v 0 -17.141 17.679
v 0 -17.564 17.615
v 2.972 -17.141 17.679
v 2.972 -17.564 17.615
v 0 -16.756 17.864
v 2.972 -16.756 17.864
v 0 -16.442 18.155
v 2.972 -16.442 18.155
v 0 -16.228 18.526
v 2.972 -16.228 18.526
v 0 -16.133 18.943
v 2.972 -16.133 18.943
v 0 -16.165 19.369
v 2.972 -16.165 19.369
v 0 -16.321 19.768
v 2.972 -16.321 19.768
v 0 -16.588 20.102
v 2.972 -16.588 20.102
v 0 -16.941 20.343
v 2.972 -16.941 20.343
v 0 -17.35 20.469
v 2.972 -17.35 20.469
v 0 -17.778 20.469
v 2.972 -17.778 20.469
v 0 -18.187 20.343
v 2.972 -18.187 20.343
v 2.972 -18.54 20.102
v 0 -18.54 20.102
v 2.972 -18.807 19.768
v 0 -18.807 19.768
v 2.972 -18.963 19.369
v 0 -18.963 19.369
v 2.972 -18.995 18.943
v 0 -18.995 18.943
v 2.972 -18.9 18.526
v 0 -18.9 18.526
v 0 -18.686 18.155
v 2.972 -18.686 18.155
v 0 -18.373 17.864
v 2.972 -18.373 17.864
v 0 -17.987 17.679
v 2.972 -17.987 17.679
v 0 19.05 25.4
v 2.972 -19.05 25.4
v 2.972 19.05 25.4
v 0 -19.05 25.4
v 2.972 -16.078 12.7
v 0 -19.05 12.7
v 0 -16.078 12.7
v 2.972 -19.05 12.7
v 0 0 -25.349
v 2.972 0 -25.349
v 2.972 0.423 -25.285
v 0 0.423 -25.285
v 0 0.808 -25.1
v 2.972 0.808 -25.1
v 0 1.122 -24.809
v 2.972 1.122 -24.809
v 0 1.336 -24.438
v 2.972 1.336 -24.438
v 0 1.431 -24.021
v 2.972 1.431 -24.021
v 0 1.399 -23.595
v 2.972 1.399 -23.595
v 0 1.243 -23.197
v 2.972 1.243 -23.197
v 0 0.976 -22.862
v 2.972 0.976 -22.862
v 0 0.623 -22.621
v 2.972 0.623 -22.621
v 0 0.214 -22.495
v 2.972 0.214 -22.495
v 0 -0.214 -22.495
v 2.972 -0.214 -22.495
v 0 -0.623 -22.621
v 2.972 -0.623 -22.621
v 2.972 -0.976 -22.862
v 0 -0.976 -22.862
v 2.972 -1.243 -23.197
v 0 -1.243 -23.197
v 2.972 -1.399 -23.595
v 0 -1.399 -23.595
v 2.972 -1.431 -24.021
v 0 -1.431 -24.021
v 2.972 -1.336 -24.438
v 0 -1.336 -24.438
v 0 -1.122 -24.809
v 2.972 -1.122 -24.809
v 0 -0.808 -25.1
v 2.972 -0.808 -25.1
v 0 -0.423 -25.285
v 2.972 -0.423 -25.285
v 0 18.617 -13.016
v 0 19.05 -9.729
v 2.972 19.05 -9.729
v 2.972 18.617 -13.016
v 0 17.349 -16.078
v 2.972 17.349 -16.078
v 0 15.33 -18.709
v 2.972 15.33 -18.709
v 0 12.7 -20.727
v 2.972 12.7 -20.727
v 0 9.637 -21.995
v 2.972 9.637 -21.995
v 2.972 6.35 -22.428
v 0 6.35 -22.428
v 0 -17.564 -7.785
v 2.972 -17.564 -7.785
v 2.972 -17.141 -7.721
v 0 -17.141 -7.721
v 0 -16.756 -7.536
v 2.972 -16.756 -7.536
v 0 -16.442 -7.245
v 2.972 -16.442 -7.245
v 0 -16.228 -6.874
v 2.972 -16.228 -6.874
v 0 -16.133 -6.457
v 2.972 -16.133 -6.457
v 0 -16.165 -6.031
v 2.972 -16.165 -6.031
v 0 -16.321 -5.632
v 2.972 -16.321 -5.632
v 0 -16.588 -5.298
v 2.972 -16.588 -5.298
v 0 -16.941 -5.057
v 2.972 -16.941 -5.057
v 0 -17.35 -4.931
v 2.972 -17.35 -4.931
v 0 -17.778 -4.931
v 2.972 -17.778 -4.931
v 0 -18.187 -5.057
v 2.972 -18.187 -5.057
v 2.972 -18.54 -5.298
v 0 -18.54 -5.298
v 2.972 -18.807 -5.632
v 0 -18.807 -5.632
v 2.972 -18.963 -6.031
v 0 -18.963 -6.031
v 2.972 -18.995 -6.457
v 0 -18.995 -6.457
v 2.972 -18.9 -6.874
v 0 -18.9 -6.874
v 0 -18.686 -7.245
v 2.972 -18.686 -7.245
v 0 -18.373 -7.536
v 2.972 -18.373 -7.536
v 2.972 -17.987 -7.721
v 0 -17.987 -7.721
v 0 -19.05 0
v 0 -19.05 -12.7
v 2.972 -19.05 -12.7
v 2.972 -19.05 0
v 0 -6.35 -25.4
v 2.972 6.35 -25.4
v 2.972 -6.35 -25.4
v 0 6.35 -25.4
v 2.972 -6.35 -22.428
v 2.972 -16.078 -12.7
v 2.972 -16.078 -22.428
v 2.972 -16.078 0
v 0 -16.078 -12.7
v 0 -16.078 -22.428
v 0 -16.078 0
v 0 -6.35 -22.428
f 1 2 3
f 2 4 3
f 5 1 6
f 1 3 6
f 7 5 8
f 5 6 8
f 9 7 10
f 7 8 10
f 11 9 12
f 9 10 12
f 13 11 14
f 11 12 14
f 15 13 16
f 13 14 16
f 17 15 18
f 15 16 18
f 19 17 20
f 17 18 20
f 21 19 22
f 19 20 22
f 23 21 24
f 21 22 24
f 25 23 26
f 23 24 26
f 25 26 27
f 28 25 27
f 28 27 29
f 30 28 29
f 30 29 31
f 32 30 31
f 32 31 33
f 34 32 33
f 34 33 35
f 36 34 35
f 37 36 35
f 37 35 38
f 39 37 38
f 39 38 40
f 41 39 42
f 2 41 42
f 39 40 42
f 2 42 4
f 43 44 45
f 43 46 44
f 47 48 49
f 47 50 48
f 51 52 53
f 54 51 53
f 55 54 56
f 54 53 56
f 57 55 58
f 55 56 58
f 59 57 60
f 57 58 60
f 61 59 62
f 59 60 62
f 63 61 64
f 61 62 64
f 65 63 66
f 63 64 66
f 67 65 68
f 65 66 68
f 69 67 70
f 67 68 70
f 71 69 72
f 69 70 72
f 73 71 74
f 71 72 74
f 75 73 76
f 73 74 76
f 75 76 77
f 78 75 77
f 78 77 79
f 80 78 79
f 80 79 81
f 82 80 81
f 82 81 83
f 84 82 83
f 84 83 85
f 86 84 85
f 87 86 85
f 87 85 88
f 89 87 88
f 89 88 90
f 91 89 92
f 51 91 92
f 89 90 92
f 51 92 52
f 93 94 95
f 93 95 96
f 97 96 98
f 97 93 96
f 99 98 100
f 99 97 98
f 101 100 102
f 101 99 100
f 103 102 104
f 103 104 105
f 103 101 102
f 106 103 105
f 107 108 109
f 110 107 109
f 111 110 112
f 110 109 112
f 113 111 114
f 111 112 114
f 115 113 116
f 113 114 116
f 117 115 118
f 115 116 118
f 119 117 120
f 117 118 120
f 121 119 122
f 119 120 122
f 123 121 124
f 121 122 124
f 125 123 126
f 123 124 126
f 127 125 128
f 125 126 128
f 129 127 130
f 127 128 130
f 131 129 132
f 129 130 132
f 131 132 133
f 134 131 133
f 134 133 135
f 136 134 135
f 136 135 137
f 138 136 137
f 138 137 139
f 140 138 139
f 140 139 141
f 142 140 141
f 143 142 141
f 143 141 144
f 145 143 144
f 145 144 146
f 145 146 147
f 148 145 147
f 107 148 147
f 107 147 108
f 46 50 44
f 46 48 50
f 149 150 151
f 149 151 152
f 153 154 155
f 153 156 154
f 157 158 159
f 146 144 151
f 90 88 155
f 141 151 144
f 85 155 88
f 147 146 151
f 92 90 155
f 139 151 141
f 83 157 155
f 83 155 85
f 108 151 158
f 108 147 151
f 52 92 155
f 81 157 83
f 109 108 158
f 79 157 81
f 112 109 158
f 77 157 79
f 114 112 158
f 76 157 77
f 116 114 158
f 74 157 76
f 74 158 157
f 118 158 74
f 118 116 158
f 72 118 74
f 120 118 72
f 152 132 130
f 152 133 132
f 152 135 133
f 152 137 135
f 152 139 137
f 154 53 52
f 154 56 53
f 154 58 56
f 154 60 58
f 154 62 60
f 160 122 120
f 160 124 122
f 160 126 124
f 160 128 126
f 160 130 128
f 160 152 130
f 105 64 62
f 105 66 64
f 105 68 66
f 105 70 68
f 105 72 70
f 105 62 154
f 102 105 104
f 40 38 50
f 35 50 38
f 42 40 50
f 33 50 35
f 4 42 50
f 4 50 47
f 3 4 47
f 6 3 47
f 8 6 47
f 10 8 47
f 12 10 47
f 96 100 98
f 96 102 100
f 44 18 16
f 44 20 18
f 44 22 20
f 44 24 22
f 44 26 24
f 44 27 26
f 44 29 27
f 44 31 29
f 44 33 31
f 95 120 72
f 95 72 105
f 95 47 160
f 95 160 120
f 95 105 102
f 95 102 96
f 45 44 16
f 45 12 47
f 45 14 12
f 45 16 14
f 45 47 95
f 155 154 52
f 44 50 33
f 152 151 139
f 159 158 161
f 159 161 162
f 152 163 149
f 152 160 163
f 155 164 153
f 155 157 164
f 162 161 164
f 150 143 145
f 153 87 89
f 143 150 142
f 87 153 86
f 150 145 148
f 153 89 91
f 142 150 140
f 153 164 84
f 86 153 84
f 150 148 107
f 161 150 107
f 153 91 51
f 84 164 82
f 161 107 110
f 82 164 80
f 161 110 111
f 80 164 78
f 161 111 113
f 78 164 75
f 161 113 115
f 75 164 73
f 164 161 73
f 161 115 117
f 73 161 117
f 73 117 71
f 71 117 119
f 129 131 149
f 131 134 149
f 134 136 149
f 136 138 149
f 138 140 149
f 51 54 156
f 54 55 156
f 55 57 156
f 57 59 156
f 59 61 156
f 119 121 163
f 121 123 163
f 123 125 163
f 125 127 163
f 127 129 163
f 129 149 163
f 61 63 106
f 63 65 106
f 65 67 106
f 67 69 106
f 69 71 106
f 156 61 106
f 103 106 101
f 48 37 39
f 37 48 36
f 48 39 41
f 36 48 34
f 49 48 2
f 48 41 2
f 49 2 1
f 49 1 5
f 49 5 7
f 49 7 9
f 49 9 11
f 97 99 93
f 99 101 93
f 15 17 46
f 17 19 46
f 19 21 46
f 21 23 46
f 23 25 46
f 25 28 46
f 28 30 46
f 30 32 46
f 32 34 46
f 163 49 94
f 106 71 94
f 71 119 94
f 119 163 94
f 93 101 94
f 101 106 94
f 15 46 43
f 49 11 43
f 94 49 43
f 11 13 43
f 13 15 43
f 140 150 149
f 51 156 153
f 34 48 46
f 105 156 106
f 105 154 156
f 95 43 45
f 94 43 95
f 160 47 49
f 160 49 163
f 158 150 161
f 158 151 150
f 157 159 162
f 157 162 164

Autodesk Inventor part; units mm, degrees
ref_plane "YZ Plane" through (0, 0, 0) normal (1, 0, 0) x (0, 1, 0)
ref_plane "XZ Plane" through (0, 0, 0) normal (0, 1, 0) x (-1, 0, 0)
ref_plane "XY Plane" through (0, 0, 0) normal (0, 0, 1) x (1, 0, 0)
sketch "Sketch1" plane through (0, 0, 0) normal (1, 0, 0) x (0, 1, 0)
  line L0 (-19.05, 25.4) -> (19.05, 25.4)
  line L1 (19.05, 25.4) -> (19.05, -25.4)
  line L2 (19.05, -25.4) -> (-19.05, -25.4)
  line L3 (-19.05, -25.4) -> (-19.05, 25.4)
  line L4 (-19.05, 25.4) -> (19.05, -25.4) construction
  line L5 (19.05, 25.4) -> (-19.05, -25.4) construction
  point P0 (0, 0)
  dimension "d0" = 38.1
  dimension "d1" = 50.8
extrude "Extrusion1" add sketch "Sketch1" along normal blind 2.9718
sketch "Sketch2" plane through (2.9718, 0, 0) normal (1, 0, 0) x (0, 0, -1)
  line L0 (-25.4, -19.05) -> (25.4, -19.05) projected
  line L1 (25.4, -19.05) -> (12.7, -19.05)
  line L2 (12.7, -19.05) -> (12.7, -16.0782)
  line L3 (12.7, -16.0782) -> (25.4, -16.0782)
  line L4 (25.4, -16.0782) -> (25.4, -19.05)
  line L5 (0, -19.05) -> (-12.7, -19.05)
  line L6 (-12.7, -19.05) -> (-12.7, -16.0782)
  line L7 (-12.7, -16.0782) -> (0, -16.0782)
  line L8 (0, -16.0782) -> (0, -19.05)
  point P0 (0, 0)
  dimension "d4" = 12.7
  dimension "d5" = 2.9718
  dimension "d6" = 12.7
extrude "Extrusion2" cut sketch "Sketch2" against normal blind 2.9718
sketch "Sketch3" plane through (2.9718, 0, 0) normal (1, 0, 0) x (0, 0, -1)
  line L0 (25.4, -19.05) -> (22.4282, -19.05)
  line L1 (22.4282, -19.05) -> (22.4282, -6.35)
  line L2 (22.4282, -6.35) -> (25.4, -6.35)
  line L3 (25.4, -6.35) -> (25.4, -19.05)
  line L4 (0, -19.05) -> (12.7, -19.05) projected
  line L5 (25.4, -16.0782) -> (25.4, 19.05) projected
  line L6 (25.4, 6.35) -> (22.4282, 6.35)
  line L7 (22.4282, 6.35) -> (22.4282, 19.05)
  line L8 (22.4282, 19.05) -> (25.4, 19.05)
  line L9 (25.4, 19.05) -> (25.4, 6.35)
  point P0 (0, 0)
  point P1 (25.4, 9.3218)
  dimension "d9" = 0
  dimension "d10" = 0
  dimension "d11" = 12.7
  dimension "d12" = 2.9718
  dimension "d15" = 25.4
extrude "Extrusion3" cut sketch "Sketch3" against normal blind 25.4
fillet "Fillet1" radius 12.7 1 edges at (1.4859, 19.05, -22.4282)
sketch "Sketch4" plane through (2.9718, 0, 0) normal (1, 0, 0) x (0, 0, -1)
  circle A0 centre (23.9141, 0) radius 1.4351
  line L0 (25.4, -6.35) -> (25.4, 6.35) projected
  circle A1 centre (6.35, -17.5641) radius 1.4351
  circle A2 centre (-19.05, -17.5641) radius 1.4351
  line L1 (22.4282, -6.35) -> (25.4, -6.35) projected
  line L2 (12.7, -19.05) -> (12.7, -16.0782) projected
  line L3 (0, -19.05) -> (12.7, -19.05) projected
  line L4 (-25.4, -19.05) -> (-12.7, -19.05) projected
  line L5 (-12.7, -19.05) -> (-12.7, -16.0782) projected
  point P0 (0, 0)
  dimension "d23" = 2.8702
  dimension "d24" = 1.4859
  dimension "d25" = 2.8702
  dimension "d26" = 2.8702
  dimension "d27" = 6.35
  dimension "d28" = 6.35
  dimension "d29" = 1.4859
  dimension "d30" = 1.4859
  dimension "d31" = 6.35
extrude "Extrusion4" cut sketch "Sketch4" against normal blind 25.4
properties part number "side1"
